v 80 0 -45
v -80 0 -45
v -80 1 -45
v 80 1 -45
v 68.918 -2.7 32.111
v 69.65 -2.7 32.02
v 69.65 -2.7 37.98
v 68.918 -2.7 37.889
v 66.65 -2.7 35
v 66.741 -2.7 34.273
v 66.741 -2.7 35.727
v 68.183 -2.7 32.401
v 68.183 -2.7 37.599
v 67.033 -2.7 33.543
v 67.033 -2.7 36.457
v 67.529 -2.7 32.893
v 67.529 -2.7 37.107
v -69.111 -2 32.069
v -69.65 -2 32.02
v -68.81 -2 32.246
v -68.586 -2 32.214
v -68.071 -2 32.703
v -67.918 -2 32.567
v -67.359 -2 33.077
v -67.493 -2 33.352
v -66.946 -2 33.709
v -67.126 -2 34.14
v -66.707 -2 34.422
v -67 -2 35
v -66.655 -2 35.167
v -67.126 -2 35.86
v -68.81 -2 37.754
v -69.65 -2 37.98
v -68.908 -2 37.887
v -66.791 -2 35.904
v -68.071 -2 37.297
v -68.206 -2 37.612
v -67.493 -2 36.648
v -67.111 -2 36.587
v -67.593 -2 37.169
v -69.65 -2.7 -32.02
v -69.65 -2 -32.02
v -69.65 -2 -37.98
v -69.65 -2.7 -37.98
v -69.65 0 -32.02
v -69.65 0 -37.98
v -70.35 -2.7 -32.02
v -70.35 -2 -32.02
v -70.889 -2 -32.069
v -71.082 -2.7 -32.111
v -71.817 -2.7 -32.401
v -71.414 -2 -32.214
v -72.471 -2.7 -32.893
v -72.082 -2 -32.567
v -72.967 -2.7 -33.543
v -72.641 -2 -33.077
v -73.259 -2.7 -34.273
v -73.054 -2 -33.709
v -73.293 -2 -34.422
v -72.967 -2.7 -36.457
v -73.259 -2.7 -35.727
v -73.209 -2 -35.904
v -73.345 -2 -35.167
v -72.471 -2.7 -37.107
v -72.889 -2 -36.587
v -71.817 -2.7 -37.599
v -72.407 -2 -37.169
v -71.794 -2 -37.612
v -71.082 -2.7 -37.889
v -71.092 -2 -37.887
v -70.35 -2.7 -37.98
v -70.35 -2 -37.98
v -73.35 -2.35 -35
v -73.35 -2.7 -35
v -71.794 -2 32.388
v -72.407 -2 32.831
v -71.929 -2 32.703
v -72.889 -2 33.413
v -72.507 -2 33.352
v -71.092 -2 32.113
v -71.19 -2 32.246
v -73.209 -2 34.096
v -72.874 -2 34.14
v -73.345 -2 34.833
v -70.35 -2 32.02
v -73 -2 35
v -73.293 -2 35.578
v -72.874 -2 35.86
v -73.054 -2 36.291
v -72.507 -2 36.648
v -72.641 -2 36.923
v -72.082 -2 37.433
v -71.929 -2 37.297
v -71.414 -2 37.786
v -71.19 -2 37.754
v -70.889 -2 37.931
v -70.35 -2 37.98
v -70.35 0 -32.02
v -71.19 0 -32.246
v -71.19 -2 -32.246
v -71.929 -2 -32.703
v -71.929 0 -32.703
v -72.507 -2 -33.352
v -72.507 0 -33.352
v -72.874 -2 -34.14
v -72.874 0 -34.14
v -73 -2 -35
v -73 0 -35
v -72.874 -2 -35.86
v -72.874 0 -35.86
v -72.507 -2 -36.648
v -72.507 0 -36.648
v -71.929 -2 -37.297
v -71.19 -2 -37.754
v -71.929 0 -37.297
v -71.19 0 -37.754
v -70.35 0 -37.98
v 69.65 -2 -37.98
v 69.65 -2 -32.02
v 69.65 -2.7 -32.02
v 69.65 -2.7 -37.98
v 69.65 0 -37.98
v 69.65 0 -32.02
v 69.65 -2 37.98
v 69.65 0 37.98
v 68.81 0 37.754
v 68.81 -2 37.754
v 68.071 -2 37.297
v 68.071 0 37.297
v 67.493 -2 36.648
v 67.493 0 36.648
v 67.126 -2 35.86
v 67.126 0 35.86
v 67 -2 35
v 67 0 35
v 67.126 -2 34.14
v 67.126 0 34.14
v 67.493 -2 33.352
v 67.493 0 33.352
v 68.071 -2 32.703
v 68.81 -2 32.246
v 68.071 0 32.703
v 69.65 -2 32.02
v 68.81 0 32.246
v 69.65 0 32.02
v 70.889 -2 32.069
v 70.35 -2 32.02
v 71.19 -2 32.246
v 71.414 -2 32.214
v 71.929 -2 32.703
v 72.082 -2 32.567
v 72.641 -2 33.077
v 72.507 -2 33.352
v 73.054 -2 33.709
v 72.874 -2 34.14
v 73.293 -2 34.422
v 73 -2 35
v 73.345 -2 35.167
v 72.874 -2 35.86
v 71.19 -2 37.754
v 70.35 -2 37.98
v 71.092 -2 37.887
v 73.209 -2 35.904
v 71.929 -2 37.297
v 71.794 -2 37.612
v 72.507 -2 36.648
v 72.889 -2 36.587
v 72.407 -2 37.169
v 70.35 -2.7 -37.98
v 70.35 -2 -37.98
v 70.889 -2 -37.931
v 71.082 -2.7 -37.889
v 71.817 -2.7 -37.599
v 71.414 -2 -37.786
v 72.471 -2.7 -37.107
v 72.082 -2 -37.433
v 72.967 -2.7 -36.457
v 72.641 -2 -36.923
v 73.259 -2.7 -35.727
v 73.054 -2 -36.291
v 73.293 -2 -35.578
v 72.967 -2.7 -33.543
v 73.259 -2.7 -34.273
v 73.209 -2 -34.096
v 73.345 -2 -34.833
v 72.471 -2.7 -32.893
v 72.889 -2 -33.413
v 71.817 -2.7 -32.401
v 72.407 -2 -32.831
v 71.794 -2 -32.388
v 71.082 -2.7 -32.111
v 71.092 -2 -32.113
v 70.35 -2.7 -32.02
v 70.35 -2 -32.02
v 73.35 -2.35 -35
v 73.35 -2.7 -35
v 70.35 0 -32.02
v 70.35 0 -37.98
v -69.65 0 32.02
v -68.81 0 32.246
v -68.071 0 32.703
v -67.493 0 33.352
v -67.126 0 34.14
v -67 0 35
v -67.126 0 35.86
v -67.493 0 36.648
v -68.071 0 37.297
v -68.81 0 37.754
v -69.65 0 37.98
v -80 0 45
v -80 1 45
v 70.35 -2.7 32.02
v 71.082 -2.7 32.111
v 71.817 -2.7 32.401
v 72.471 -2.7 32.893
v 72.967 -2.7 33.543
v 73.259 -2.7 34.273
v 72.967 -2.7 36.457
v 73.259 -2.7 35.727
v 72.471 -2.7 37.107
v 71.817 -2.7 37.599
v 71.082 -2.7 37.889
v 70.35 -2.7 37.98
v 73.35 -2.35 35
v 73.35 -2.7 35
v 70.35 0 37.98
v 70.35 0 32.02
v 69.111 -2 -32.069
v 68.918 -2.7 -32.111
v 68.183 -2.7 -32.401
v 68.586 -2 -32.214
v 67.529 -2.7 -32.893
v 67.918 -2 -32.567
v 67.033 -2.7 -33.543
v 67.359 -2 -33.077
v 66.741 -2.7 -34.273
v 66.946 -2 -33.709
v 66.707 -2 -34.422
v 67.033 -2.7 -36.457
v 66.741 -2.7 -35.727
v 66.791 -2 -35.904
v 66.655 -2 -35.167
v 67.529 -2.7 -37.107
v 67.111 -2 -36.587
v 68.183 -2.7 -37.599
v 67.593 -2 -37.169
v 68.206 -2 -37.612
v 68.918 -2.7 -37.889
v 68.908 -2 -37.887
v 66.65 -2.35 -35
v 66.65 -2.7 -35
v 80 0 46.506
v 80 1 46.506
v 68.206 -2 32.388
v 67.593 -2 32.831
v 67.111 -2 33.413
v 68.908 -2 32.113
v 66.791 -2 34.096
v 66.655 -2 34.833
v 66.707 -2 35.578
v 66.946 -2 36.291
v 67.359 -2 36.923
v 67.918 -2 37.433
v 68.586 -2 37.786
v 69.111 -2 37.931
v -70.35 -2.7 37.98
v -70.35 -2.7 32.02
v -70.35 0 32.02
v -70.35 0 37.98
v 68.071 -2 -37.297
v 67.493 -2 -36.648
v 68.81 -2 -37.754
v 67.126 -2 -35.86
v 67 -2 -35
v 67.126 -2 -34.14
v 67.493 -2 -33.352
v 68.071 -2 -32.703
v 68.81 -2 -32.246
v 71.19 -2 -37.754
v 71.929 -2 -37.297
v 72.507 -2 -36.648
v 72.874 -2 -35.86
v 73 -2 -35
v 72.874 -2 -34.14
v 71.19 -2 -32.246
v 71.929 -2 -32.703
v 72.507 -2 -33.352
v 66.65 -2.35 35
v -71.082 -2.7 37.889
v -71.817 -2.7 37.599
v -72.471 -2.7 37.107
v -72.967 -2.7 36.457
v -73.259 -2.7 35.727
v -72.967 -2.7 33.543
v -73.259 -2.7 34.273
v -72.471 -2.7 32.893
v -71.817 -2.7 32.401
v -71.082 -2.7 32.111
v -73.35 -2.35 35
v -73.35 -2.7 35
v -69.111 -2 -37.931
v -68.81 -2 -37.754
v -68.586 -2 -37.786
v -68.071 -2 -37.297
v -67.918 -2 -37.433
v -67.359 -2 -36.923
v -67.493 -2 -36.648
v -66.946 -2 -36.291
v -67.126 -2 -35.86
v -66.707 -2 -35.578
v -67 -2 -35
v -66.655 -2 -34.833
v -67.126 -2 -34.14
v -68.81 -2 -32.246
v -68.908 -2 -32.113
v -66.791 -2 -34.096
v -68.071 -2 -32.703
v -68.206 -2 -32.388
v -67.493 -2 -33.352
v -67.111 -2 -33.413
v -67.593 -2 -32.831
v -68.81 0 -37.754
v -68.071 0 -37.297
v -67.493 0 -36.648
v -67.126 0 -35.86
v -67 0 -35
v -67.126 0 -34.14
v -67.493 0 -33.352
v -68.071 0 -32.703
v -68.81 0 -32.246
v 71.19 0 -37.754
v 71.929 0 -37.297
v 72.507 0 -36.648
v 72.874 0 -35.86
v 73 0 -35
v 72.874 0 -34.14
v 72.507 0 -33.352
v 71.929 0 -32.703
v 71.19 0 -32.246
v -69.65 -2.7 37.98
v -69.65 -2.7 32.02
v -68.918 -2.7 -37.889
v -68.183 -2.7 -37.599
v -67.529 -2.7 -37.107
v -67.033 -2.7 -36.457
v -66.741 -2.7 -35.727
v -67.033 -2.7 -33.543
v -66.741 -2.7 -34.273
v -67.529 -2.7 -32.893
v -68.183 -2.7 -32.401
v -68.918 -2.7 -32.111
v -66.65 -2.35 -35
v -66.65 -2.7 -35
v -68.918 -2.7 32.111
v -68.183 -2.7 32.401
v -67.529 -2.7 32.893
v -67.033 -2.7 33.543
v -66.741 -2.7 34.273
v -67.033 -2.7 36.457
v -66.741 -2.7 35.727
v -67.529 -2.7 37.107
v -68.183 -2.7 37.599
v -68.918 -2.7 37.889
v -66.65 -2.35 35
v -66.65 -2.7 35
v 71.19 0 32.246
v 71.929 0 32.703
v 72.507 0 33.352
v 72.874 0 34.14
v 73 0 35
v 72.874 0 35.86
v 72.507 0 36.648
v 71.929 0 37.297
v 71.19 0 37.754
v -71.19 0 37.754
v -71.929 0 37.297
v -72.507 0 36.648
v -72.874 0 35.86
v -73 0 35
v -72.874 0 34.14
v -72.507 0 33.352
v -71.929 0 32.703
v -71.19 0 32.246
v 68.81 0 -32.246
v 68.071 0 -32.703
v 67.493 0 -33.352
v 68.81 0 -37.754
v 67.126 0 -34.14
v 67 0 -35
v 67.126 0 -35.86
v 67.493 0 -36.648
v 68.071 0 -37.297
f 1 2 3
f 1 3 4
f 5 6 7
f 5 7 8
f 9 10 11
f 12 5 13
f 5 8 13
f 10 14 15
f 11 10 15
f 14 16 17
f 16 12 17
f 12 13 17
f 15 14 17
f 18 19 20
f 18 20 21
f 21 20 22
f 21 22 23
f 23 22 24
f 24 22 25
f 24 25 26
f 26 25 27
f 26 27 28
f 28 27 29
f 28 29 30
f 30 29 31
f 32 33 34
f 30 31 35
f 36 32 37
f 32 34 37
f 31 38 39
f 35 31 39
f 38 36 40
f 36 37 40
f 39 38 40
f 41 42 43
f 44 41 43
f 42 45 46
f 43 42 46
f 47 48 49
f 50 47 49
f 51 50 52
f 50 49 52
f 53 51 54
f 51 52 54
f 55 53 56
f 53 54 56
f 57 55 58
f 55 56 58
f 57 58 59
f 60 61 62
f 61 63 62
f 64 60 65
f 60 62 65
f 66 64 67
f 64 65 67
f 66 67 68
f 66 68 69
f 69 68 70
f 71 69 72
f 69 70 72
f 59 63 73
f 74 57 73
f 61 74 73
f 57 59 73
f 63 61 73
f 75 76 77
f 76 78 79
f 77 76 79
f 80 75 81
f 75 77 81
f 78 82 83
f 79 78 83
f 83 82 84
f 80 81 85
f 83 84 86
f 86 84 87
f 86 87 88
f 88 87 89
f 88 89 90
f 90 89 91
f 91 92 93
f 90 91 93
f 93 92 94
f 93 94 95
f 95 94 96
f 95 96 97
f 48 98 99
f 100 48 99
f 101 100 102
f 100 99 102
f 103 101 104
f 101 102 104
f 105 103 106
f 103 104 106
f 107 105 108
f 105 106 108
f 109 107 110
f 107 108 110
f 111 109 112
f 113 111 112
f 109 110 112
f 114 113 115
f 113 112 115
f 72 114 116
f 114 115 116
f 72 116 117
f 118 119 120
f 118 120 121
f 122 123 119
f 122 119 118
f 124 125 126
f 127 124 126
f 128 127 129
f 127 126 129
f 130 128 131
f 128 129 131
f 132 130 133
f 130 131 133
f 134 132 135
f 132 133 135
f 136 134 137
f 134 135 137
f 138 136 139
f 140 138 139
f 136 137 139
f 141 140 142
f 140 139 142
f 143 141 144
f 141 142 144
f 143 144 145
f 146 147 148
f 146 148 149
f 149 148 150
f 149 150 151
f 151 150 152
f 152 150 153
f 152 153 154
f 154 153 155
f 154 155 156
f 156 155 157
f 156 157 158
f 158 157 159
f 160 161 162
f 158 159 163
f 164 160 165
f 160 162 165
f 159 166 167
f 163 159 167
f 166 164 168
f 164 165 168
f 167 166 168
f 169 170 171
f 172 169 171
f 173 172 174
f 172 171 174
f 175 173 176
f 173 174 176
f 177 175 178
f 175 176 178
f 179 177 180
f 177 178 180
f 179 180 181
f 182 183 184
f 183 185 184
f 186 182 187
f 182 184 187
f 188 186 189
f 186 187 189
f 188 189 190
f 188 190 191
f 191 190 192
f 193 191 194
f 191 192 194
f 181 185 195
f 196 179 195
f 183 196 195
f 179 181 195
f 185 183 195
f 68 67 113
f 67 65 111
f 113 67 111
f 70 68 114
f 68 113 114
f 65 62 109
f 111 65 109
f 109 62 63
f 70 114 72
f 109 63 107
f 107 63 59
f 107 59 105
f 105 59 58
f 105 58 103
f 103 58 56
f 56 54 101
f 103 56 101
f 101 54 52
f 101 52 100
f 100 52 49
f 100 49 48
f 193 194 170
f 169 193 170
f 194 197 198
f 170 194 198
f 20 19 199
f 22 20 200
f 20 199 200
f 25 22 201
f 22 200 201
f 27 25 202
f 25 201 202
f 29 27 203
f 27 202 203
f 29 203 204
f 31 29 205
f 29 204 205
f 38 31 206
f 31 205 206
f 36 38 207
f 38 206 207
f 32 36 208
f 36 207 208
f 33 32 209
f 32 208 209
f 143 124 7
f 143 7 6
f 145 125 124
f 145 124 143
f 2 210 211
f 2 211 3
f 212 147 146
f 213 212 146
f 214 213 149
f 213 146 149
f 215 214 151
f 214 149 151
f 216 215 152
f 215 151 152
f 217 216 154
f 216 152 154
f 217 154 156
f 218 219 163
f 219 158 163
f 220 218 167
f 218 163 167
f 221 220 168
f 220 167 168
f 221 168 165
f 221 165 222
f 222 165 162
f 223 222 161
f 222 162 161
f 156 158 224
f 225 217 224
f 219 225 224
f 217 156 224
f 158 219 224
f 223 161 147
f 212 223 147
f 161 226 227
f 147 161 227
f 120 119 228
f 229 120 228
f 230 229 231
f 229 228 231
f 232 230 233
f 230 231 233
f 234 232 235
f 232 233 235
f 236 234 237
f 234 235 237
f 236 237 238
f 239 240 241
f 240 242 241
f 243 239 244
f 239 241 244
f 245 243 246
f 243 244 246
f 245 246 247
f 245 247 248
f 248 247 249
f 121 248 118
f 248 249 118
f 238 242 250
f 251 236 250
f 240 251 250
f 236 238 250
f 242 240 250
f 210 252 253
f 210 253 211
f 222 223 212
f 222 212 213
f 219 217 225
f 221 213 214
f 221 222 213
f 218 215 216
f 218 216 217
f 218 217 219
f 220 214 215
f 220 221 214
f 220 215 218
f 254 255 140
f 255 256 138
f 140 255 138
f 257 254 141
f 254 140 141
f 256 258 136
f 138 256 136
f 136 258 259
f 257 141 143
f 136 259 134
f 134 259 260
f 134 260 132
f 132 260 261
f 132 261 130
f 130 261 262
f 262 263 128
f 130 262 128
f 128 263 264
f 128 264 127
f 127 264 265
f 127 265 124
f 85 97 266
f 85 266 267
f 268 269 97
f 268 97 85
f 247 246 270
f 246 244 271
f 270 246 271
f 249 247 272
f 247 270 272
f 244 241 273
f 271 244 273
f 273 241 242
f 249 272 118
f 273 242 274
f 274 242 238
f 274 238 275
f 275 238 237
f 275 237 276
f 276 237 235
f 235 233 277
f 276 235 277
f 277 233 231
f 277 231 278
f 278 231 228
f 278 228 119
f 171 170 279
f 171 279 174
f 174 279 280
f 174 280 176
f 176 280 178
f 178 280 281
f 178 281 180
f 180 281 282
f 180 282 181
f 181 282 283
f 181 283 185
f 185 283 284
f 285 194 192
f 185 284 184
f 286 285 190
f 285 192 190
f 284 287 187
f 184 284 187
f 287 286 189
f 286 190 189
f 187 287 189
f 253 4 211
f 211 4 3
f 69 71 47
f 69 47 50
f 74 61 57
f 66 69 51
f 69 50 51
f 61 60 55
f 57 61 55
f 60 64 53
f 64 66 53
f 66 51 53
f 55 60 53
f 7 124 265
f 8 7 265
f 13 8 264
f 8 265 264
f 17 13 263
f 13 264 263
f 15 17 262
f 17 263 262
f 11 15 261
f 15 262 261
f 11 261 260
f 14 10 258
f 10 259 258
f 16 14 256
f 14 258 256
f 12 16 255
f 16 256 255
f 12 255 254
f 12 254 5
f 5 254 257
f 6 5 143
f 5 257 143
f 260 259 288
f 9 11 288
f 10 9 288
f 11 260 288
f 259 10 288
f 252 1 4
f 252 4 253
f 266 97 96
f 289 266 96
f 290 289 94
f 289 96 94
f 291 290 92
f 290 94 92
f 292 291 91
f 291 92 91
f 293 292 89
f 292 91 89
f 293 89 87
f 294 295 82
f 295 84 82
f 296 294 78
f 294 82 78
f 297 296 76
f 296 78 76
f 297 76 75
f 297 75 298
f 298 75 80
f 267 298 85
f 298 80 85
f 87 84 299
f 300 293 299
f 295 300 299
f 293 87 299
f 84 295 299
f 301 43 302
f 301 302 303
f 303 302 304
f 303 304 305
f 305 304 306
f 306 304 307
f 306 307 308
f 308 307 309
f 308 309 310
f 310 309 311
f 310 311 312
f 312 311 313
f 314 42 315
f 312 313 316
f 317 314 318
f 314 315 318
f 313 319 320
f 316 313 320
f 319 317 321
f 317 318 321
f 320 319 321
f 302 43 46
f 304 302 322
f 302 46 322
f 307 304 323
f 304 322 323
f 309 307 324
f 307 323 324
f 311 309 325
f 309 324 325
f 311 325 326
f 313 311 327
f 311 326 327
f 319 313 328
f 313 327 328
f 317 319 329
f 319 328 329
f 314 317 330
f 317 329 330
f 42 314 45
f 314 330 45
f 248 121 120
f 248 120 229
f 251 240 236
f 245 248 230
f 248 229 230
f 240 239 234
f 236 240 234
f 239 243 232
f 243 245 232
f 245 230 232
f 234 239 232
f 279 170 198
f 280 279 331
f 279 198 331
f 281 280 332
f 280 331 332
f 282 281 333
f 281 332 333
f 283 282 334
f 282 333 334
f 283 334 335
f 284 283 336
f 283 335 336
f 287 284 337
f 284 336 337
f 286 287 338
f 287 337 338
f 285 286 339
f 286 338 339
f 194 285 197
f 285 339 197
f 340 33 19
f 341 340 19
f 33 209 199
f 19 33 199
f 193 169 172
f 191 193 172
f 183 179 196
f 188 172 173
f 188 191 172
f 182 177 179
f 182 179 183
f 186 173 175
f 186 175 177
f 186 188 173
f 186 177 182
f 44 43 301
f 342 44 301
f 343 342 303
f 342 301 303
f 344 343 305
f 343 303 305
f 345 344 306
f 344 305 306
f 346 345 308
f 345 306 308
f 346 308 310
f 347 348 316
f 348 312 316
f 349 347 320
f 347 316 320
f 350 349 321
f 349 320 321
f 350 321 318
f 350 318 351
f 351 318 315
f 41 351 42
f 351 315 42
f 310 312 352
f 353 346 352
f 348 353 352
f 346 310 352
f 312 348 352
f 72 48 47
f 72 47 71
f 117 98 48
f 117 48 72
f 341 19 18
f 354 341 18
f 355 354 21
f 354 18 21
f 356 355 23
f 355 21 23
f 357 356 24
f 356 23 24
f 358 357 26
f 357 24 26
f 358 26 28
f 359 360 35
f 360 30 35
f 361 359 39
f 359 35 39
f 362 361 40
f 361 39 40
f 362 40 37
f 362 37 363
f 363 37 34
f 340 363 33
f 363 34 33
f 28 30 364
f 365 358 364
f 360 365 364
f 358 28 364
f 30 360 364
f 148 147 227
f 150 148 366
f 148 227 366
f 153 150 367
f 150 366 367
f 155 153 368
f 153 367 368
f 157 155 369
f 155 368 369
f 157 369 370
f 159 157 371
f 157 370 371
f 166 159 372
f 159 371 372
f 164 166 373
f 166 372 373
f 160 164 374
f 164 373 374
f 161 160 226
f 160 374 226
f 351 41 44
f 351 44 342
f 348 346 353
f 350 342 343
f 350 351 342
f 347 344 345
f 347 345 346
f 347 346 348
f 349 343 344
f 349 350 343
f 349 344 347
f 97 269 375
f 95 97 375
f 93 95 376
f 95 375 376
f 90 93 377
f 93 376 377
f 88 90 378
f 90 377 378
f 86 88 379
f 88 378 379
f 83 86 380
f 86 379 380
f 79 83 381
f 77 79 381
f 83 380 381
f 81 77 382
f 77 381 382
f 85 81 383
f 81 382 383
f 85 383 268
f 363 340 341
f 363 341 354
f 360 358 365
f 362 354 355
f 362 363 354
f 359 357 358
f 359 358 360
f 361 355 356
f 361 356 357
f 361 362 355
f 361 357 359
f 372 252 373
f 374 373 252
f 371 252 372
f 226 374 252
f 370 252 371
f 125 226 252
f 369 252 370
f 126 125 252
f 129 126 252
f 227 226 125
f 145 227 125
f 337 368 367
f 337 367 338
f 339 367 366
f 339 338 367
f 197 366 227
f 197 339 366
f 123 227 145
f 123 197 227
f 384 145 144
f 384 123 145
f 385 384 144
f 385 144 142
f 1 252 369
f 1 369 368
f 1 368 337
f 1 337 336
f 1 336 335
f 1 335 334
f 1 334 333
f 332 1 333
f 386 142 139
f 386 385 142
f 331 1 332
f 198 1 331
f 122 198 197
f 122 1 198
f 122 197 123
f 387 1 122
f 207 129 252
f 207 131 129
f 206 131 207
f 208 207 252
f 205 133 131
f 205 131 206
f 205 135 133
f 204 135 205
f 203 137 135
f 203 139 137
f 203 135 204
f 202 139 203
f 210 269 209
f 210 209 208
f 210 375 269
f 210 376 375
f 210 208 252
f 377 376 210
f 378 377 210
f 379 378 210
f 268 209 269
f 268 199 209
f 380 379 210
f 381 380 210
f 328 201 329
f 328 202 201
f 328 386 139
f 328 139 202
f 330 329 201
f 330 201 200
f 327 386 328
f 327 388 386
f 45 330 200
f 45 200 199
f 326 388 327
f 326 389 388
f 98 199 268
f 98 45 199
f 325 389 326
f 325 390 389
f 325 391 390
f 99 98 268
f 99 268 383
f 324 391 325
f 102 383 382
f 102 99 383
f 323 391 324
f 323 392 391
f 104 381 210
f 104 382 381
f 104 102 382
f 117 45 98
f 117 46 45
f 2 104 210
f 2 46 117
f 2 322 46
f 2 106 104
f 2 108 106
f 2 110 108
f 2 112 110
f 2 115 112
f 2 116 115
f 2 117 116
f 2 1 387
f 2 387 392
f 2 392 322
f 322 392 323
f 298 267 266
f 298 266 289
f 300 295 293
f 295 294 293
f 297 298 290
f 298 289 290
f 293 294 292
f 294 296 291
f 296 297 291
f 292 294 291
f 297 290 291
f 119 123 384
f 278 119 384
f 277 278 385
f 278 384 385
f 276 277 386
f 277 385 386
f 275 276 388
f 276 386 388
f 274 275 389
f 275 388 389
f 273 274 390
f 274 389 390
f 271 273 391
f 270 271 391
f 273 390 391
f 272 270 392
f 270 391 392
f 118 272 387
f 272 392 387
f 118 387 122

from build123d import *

# Parameters (mm, degrees)
BOSS_EXTRUDE1_DEPTH = 1
BOSS_EXTRUDE2_DEPTH = 2.7
SKETCH5_OUTSIDE_W   = 198.872
SKETCH5_OUTSIDE_H   = 130.378
SKETCH5_OUTSIDE_R   = 3
CUT_EXTRUDE1_DEPTH  = 2


with BuildPart() as part:
    # Sketch3 → Boss-Extrude1 (new body)
    with BuildSketch(Plane(origin=(0, 0, 0), x_dir=(1, 0, 0), z_dir=(0, 1, 0))):
        Polygon((-80, 45), (80, 45), (80, -46.505636843), (-80, -45), align=None)
    extrude(amount=BOSS_EXTRUDE1_DEPTH)

    # Sketch4 → Boss-Extrude2 (add)
    with BuildSketch(Plane.XZ):
        with BuildLine():
            Line((-70.35, 37.979513383), (-70.35, 32.020486617))
            add(Edge.make_bspline(
                [(-70.35, 37.979513383), (-73.35, 37.979513383), (-73.35, 35), (-73.35, 32.020486617), (-70.35, 32.020486617)],
                knots=[4.71238898, 4.71238898, 4.71238898, 6.283185307, 6.283185307, 7.853981634, 7.853981634, 7.853981634], degree=2, weights=[1, 0.707106781, 1, 0.707106781, 1]))
        make_face()
        with BuildLine():
            Line((-69.65, 37.979513383), (-69.65, 32.020486617))
            add(Edge.make_bspline(
                [(-69.65, 32.020486617), (-66.65, 32.020486617), (-66.65, 35), (-66.65, 37.979513383), (-69.65, 37.979513383)],
                knots=[4.71238898, 4.71238898, 4.71238898, 6.283185307, 6.283185307, 7.853981634, 7.853981634, 7.853981634], degree=2, weights=[1, 0.707106781, 1, 0.707106781, 1]))
        make_face()
        with BuildLine():
            Line((69.65, 37.979513383), (69.65, 32.020486617))
            add(Edge.make_bspline(
                [(69.65, 37.979513383), (66.65, 37.979513383), (66.65, 35), (66.65, 32.020486617), (69.65, 32.020486617)],
                knots=[4.71238898, 4.71238898, 4.71238898, 6.283185307, 6.283185307, 7.853981634, 7.853981634, 7.853981634], degree=2, weights=[1, 0.707106781, 1, 0.707106781, 1]))
        make_face()
        with BuildLine():
            Line((70.35, 37.979513383), (70.35, 32.020486617))
            add(Edge.make_bspline(
                [(70.35, 32.020486617), (73.35, 32.020486617), (73.35, 35), (73.35, 37.979513383), (70.35, 37.979513383)],
                knots=[4.71238898, 4.71238898, 4.71238898, 6.283185307, 6.283185307, 7.853981634, 7.853981634, 7.853981634], degree=2, weights=[1, 0.707106781, 1, 0.707106781, 1]))
        make_face()
        with BuildLine():
            Line((69.65, -32.020486617), (69.65, -37.979513383))
            add(Edge.make_bspline(
                [(69.65, -32.020486617), (66.65, -32.020486617), (66.65, -35), (66.65, -37.979513383), (69.65, -37.979513383)],
                knots=[4.71238898, 4.71238898, 4.71238898, 6.283185307, 6.283185307, 7.853981634, 7.853981634, 7.853981634], degree=2, weights=[1, 0.707106781, 1, 0.707106781, 1]))
        make_face()
        with BuildLine():
            Line((70.35, -32.020486617), (70.35, -37.979513383))
            add(Edge.make_bspline(
                [(70.35, -37.979513383), (73.35, -37.979513383), (73.35, -35), (73.35, -32.020486617), (70.35, -32.020486617)],
                knots=[4.71238898, 4.71238898, 4.71238898, 6.283185307, 6.283185307, 7.853981634, 7.853981634, 7.853981634], degree=2, weights=[1, 0.707106781, 1, 0.707106781, 1]))
        make_face()
        with BuildLine():
            Line((-70.35, -32.020486617), (-70.35, -37.979513383))
            add(Edge.make_bspline(
                [(-70.35, -32.020486617), (-73.35, -32.020486617), (-73.35, -35), (-73.35, -37.979513383), (-70.35, -37.979513383)],
                knots=[4.71238898, 4.71238898, 4.71238898, 6.283185307, 6.283185307, 7.853981634, 7.853981634, 7.853981634], degree=2, weights=[1, 0.707106781, 1, 0.707106781, 1]))
        make_face()
        with BuildLine():
            Line((-69.65, -32.020486617), (-69.65, -37.979513383))
            add(Edge.make_bspline(
                [(-69.65, -37.979513383), (-66.65, -37.979513383), (-66.65, -35), (-66.65, -32.020486617), (-69.65, -32.020486617)],
                knots=[4.71238898, 4.71238898, 4.71238898, 6.283185307, 6.283185307, 7.853981634, 7.853981634, 7.853981634], degree=2, weights=[1, 0.707106781, 1, 0.707106781, 1]))
        make_face()
    extrude(amount=BOSS_EXTRUDE2_DEPTH)

    # Sketch5 outside → Cut-Extrude1 (cut)
    with BuildSketch(Plane.XZ):
        with Locations((0, 0.753)):
            Rectangle(SKETCH5_OUTSIDE_W, SKETCH5_OUTSIDE_H)
        with Locations((-70, 35)):
            Circle(SKETCH5_OUTSIDE_R, mode=Mode.SUBTRACT)
        with Locations((70, 35)):
            Circle(SKETCH5_OUTSIDE_R, mode=Mode.SUBTRACT)
        with Locations((70, -35)):
            Circle(SKETCH5_OUTSIDE_R, mode=Mode.SUBTRACT)
        with Locations((-70, -35)):
            Circle(SKETCH5_OUTSIDE_R, mode=Mode.SUBTRACT)
    extrude(amount=CUT_EXTRUDE1_DEPTH, mode=Mode.SUBTRACT)


solid = part.part
